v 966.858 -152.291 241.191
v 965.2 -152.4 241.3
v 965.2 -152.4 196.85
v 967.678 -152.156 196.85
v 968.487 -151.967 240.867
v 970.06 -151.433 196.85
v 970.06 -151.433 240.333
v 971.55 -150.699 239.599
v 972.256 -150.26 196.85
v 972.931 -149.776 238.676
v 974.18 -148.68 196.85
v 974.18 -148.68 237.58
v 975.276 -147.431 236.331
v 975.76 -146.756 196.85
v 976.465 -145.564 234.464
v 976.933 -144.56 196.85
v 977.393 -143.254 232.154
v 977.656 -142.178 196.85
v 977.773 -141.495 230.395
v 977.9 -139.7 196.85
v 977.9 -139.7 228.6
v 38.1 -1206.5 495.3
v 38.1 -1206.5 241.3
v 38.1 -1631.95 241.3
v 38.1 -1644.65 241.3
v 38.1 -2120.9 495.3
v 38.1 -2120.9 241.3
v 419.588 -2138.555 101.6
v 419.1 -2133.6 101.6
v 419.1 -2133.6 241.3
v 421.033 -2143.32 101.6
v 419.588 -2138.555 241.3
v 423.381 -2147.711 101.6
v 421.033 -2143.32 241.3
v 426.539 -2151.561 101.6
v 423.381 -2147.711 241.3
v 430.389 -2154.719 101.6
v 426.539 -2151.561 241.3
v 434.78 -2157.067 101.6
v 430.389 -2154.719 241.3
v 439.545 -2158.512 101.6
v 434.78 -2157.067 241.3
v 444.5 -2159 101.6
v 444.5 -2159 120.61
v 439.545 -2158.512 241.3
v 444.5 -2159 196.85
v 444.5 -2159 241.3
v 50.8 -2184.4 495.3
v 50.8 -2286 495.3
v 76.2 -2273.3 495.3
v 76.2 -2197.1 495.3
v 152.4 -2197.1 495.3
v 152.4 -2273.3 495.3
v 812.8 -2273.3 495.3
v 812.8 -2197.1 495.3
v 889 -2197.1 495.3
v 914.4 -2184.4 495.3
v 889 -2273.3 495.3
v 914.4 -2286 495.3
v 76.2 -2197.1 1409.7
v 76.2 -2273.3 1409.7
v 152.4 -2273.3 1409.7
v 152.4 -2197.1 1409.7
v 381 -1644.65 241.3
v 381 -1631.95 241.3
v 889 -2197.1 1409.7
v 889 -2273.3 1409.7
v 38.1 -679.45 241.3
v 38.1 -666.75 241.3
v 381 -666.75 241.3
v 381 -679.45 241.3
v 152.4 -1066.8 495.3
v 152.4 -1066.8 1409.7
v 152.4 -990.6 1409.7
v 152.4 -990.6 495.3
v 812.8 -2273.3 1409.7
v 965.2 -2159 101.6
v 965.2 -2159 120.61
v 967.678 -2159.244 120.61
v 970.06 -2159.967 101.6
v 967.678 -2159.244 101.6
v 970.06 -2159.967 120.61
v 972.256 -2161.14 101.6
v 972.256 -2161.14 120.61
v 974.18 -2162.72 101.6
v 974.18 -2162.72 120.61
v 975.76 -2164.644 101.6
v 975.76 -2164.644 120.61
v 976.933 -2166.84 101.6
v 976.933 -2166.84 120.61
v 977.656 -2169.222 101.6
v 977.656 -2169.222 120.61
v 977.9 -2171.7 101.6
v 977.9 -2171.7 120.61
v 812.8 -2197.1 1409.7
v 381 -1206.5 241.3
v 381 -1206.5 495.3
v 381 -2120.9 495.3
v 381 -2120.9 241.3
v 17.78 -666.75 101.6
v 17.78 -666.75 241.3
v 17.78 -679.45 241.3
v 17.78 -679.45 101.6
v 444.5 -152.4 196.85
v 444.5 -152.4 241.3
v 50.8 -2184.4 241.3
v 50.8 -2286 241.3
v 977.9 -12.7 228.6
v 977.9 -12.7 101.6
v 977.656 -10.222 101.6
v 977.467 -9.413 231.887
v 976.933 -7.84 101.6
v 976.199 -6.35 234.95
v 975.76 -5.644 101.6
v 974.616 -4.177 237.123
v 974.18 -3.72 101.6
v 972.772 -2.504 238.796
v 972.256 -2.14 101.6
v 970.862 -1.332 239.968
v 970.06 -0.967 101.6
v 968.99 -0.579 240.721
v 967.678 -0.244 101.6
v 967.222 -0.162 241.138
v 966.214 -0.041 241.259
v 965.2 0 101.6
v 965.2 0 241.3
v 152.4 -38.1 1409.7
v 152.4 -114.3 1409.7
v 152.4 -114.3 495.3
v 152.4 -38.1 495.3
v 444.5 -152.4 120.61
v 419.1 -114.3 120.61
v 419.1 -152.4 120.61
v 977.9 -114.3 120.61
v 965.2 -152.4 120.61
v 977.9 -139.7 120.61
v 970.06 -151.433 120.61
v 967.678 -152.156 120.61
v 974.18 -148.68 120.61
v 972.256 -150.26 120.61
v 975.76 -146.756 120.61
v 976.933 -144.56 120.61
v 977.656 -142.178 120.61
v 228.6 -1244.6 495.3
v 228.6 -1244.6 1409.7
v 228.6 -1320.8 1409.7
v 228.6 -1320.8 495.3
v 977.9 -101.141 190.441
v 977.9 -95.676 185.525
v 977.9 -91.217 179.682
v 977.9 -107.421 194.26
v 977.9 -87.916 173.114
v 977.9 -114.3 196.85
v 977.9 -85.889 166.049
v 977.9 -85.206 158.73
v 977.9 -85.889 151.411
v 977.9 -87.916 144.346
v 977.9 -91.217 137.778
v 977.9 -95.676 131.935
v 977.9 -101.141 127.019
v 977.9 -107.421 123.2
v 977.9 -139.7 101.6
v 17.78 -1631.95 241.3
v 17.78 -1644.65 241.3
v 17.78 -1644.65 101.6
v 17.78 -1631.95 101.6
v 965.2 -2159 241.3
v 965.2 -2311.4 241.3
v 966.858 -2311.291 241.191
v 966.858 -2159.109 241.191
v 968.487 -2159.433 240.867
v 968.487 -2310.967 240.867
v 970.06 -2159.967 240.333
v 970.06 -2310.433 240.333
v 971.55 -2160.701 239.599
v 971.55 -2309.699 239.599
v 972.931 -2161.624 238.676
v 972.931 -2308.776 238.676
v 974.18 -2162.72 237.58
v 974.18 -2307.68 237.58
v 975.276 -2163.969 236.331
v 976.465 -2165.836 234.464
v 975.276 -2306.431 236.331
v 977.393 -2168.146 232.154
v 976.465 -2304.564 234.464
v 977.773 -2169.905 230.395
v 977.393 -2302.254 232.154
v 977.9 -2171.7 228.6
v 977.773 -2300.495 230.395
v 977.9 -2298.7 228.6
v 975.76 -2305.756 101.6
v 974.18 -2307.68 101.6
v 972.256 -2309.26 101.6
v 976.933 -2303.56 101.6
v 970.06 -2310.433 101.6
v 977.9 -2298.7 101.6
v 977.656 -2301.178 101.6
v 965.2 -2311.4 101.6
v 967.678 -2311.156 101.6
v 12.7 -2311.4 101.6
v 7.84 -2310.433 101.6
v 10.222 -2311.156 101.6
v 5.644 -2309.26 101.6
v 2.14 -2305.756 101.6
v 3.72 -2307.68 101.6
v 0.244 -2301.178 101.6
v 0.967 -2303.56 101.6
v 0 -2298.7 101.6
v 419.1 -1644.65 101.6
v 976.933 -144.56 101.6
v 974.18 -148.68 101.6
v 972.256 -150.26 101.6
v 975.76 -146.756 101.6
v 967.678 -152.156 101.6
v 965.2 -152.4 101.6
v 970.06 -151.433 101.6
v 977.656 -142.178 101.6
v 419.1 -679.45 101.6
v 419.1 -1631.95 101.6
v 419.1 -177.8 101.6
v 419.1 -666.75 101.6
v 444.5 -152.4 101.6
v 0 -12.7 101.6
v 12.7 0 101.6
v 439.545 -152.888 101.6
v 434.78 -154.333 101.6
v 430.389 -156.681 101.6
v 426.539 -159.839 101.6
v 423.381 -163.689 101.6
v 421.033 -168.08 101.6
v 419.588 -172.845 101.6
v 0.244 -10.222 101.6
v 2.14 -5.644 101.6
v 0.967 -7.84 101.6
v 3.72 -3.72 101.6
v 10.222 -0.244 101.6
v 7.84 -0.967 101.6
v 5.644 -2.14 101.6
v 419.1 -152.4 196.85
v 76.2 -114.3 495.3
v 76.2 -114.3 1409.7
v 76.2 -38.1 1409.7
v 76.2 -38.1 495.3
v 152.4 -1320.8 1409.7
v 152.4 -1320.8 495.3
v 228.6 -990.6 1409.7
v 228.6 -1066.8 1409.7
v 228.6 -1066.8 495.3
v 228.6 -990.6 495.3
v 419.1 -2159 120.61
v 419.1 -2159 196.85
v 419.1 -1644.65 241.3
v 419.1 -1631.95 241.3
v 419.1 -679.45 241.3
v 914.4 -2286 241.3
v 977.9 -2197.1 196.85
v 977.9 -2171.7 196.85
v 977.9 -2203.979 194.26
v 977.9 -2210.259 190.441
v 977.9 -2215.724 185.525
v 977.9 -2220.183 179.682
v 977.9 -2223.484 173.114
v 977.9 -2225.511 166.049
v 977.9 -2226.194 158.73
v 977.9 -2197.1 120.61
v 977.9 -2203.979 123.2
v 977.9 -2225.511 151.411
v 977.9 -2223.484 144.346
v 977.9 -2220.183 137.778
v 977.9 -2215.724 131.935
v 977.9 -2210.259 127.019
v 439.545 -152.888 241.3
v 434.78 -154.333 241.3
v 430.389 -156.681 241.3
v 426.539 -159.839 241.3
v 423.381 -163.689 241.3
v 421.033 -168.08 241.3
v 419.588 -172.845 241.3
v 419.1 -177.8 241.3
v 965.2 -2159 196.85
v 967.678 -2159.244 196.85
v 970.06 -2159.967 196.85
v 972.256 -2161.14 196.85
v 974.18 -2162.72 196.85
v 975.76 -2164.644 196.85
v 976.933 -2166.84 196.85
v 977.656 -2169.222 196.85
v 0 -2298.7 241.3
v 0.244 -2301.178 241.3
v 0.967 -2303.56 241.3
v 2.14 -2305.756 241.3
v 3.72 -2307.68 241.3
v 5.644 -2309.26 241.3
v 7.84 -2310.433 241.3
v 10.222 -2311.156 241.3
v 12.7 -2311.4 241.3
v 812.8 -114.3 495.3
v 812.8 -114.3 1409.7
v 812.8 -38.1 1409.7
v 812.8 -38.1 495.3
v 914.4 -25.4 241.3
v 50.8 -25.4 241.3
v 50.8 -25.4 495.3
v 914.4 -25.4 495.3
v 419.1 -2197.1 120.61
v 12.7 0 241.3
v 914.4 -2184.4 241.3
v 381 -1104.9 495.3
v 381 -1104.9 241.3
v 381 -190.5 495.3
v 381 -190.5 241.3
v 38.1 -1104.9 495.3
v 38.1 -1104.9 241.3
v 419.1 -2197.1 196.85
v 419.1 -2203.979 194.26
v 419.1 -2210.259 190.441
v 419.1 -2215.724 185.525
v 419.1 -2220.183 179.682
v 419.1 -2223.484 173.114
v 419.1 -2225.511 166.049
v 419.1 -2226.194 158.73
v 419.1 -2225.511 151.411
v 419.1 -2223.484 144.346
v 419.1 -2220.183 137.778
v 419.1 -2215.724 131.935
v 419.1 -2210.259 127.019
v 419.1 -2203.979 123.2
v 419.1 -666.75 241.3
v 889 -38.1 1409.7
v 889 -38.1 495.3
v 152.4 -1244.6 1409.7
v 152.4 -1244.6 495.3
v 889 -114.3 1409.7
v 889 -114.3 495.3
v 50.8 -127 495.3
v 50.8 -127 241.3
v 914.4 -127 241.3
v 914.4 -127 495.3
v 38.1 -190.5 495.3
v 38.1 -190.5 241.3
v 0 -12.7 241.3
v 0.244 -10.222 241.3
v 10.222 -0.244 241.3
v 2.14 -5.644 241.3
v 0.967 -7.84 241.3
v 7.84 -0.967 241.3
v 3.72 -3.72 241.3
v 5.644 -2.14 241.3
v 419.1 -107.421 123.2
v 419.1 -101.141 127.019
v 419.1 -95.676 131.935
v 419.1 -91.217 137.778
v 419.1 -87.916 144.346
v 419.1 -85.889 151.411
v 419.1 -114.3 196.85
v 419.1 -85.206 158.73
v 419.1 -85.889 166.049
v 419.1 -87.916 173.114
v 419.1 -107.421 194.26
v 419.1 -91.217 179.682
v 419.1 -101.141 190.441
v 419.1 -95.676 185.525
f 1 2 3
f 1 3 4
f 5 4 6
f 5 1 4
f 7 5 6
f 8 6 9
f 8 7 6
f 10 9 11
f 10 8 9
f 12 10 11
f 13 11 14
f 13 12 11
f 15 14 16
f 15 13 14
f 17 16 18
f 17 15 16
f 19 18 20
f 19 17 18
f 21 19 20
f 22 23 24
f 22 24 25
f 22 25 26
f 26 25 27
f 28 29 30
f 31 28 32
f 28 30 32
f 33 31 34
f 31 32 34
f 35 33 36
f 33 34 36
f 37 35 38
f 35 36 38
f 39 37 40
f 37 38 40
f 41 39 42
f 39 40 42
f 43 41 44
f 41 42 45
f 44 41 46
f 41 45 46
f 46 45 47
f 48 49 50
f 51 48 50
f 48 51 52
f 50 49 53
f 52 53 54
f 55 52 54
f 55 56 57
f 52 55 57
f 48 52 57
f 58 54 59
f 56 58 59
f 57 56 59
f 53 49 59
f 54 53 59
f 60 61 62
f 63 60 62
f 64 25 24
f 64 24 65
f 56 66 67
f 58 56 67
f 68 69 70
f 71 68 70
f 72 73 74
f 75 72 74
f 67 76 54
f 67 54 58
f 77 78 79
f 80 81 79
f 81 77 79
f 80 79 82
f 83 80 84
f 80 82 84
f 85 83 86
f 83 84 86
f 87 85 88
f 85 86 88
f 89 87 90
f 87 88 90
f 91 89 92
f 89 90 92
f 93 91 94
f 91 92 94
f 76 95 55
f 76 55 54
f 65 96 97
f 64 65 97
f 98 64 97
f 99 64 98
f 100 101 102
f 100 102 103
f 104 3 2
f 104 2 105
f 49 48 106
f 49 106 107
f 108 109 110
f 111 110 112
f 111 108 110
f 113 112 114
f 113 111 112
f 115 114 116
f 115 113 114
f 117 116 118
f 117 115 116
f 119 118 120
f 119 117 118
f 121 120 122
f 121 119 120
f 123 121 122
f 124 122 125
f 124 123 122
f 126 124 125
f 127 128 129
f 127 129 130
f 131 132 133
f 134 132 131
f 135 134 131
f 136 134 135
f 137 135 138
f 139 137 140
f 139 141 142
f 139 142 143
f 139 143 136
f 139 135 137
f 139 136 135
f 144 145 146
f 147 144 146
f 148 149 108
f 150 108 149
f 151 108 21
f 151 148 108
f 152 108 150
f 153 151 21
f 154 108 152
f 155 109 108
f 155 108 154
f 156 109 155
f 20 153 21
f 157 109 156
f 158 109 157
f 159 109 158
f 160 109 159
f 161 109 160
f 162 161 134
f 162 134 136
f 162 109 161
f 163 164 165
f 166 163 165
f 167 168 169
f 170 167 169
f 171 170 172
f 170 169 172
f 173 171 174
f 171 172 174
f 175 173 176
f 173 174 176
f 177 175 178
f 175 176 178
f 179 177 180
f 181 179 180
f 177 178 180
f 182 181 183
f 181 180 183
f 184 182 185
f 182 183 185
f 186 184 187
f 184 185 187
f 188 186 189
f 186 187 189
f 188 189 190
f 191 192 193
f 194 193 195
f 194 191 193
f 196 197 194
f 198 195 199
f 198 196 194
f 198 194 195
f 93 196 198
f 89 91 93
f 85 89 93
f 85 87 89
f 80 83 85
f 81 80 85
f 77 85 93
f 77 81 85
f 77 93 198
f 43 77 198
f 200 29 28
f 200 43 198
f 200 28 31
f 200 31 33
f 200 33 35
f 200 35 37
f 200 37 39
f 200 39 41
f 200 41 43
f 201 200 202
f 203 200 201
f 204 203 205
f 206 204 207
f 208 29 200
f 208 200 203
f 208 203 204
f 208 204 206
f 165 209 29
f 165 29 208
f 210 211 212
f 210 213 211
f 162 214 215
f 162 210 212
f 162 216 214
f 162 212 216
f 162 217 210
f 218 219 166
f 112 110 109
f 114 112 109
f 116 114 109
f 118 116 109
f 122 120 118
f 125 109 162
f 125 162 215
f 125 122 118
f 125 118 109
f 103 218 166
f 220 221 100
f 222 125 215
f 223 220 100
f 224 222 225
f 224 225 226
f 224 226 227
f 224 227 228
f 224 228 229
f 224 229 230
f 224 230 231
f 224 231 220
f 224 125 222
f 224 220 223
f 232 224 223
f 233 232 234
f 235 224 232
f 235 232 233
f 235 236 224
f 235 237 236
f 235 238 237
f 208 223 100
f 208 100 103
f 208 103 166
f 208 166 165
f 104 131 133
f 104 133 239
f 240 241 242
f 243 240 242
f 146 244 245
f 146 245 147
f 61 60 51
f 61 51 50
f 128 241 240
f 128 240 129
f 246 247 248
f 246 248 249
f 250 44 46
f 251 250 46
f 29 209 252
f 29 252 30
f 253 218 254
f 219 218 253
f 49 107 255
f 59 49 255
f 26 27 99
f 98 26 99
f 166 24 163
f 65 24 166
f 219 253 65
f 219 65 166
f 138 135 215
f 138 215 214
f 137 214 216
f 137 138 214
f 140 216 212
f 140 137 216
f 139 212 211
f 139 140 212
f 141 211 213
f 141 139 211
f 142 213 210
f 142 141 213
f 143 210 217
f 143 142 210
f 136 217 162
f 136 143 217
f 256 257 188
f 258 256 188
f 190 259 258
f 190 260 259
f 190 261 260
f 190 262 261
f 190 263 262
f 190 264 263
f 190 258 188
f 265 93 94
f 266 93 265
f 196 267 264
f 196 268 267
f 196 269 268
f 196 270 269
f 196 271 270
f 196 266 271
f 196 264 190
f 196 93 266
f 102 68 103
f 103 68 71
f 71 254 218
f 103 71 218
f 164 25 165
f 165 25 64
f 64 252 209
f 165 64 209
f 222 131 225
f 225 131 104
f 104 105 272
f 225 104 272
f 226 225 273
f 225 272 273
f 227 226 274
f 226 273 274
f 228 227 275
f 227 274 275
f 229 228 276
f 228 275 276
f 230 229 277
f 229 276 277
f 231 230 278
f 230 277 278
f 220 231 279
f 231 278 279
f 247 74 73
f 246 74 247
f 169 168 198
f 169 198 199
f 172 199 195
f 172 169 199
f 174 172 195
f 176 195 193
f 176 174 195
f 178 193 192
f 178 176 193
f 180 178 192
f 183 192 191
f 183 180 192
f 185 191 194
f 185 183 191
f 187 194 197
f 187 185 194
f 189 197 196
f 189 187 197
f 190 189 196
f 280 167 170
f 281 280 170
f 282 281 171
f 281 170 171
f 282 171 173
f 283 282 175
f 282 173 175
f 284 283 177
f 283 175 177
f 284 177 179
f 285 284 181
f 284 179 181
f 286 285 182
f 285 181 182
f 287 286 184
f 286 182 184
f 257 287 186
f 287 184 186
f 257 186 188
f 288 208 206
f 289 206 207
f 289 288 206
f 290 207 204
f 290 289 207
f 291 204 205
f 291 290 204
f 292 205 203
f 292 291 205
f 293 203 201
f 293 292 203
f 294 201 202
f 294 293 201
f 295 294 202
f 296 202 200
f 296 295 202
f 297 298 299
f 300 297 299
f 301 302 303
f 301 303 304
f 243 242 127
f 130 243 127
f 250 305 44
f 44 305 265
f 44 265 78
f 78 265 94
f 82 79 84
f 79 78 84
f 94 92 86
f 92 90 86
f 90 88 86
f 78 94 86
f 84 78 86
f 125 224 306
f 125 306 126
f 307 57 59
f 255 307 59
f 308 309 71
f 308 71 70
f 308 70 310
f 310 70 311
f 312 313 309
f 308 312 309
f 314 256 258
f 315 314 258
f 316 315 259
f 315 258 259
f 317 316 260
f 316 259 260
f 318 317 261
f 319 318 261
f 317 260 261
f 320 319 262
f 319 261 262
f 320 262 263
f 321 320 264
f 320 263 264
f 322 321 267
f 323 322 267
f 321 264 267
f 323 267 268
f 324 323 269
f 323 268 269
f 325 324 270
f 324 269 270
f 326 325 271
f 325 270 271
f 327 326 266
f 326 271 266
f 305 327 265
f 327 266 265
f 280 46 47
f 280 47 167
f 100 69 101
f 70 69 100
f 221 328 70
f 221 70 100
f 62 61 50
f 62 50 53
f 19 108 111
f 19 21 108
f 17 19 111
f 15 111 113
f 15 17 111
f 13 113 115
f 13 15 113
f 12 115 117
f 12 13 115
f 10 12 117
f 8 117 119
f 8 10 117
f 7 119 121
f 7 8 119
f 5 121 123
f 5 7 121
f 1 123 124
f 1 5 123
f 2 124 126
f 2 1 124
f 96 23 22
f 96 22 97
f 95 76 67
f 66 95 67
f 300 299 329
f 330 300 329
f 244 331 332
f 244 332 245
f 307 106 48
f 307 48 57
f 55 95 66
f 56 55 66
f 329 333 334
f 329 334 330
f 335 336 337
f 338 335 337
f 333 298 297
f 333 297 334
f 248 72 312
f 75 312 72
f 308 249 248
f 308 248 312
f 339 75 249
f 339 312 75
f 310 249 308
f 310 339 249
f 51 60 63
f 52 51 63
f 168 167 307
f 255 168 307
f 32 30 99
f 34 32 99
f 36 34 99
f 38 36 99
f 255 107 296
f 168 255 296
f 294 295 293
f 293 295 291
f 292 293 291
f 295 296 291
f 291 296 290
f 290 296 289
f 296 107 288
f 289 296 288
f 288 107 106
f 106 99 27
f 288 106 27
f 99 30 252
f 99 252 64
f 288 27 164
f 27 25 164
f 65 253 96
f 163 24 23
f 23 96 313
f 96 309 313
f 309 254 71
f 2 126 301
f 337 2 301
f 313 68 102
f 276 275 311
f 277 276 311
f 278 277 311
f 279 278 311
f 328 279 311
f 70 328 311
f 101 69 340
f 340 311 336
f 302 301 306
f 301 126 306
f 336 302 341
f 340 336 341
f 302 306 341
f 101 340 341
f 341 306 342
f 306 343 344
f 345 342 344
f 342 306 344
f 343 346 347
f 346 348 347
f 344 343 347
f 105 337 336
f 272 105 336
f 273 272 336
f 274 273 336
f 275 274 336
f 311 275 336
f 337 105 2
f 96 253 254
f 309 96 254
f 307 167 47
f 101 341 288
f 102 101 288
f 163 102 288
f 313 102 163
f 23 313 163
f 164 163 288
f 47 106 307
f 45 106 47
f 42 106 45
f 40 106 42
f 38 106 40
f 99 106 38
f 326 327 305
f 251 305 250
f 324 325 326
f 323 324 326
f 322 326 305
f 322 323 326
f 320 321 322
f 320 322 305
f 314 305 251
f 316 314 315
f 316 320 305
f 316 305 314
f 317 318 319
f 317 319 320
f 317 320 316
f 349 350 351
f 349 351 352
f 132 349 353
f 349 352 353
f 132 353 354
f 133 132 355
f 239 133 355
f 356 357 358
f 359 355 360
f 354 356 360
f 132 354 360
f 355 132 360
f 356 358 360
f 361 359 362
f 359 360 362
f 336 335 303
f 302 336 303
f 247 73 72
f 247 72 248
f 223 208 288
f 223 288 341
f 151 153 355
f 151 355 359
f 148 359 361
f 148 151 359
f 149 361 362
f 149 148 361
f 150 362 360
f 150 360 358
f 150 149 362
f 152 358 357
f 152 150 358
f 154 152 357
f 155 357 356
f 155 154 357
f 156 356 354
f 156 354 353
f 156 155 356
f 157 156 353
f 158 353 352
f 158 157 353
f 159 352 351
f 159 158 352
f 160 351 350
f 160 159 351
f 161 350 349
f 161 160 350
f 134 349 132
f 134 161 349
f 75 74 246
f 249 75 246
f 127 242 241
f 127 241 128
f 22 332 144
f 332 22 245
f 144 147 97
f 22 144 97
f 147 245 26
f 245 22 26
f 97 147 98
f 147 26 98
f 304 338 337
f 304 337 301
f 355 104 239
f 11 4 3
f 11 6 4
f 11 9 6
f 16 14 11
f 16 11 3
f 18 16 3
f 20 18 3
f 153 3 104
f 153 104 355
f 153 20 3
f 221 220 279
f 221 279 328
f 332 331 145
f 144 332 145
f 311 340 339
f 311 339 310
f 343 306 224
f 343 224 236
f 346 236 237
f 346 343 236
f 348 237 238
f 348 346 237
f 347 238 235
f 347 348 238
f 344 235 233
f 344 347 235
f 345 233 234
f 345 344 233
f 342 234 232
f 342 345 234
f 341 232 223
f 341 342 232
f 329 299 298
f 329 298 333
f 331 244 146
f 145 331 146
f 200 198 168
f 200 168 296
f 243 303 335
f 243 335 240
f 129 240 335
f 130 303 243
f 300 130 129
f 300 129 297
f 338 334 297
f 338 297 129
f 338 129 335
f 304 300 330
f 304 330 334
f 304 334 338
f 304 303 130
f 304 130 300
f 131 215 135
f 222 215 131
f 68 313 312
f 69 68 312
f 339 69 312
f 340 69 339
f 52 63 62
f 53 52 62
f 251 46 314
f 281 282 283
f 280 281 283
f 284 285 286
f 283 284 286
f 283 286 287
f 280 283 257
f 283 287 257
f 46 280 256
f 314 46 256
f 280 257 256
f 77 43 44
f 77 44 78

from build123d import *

# Parameters (mm, degrees)
BOSS_EXTRUDE1_DEPTH = 241.3
FILLET1_R           = 25.4
FILLET2_R           = 12.7
CUT_EXTRUDE1_DEPTH  = 558.8
SKETCH3_W           = 1114.093901139
SKETCH3_H           = 2455.440787086
CUT_EXTRUDE5_DEPTH  = 101.6
SKETCH4_W           = 139.7
SKETCH4_H           = 12.7
CUT_EXTRUDE6_DEPTH  = 401.32
SKETCH9_W           = 863.6
SKETCH9_H           = 101.6
SKETCH9_W_2         = 342.9
SKETCH9_H_2         = 914.4
BOSS_EXTRUDE5_DEPTH = 254
SKETCH10_W          = 76.2
SKETCH10_H          = 76.2
BOSS_EXTRUDE6_DEPTH = 914.4


with BuildPart() as part:
    # Sketch1 → Boss-Extrude1 (new body)
    with BuildSketch(Plane.XY):
        Polygon((977.9, -152.4), (419.1, -152.4), (419.1, -2159), (977.9, -2159), (977.9, -2311.4), (0, -2311.4), (0, 0), (977.9, 0), align=None)
    extrude(amount=BOSS_EXTRUDE1_DEPTH)

    # Fillet1
    fillet1_edges = [part.edges().sort_by_distance(p)[0] for p in [
        (419.1, -152.4, 120.65),
        (419.1, -2159, 120.65),
    ]]
    fillet(fillet1_edges, radius=FILLET1_R)

    # Fillet2
    fillet2_edges = [part.edges().sort_by_distance(p)[0] for p in [
        (977.9, -2235.2, 241.3),
        (0, 0, 120.65),
        (977.9, 0, 120.65),
        (977.9, -152.4, 120.65),
        (977.9, -2159, 120.65),
        (977.9, -2311.4, 120.65),
        (0, -2311.4, 120.65),
        (977.9, -76.2, 241.3),
        (977.9, -76.2, 0),
        (977.9, -2235.2, 0),
    ]]
    fillet(fillet2_edges, radius=FILLET2_R)

    # Sketch2 → Cut-Extrude1 (cut)
    with BuildSketch(Plane(origin=(977.9, 0, 0), x_dir=(0, 0, -1), z_dir=(1, 0, 0))):
        with BuildLine():
            Line((-196.85, -152.4), (-196.85, -114.3))
            ThreePointArc((-196.85, -114.3), (-158.73, -85.205737384), (-120.61, -114.3))
            Line((-120.61, -114.3), (-120.61, -152.4))
            Line((-120.61, -152.4), (-196.85, -152.4))
        make_face()
    cut_extrude1 = extrude(amount=-CUT_EXTRUDE1_DEPTH, mode=Mode.SUBTRACT)

    # Mirror1: Cut-Extrude1 across plane
    add(cut_extrude1.mirror(Plane.ZX.offset(-1155.7)), mode=Mode.SUBTRACT)

    # Sketch3 → Cut-Extrude5 (cut)
    with BuildSketch(Plane(origin=(0, 0, 0), x_dir=(-1, 0, 0), z_dir=(0, 0, -1))):
        with Locations((-472.168855083, -1170.106383975)):
            Rectangle(SKETCH3_W, SKETCH3_H)
    extrude(amount=-CUT_EXTRUDE5_DEPTH, mode=Mode.SUBTRACT)

    # Sketch4 → Cut-Extrude6 (cut)
    with BuildSketch(Plane(origin=(419.1, 0, 0), x_dir=(0, 0, -1), z_dir=(1, 0, 0))):
        with Locations((-171.45, -673.1)):
            Rectangle(SKETCH4_W, SKETCH4_H)
    cut_extrude6 = extrude(amount=-CUT_EXTRUDE6_DEPTH, mode=Mode.SUBTRACT)

    # Mirror2: Cut-Extrude6 across plane
    add(cut_extrude6.mirror(Plane.ZX.offset(-1155.7)), mode=Mode.SUBTRACT)

    # Sketch9 → Boss-Extrude5 (add)
    with BuildSketch(Plane.XY.offset(241.3)):
        with Locations((482.6, -76.2)):
            Rectangle(SKETCH9_W, SKETCH9_H)
        with Locations((209.55, -647.7)):
            Rectangle(SKETCH9_W_2, SKETCH9_H_2)
    boss_extrude5 = extrude(amount=BOSS_EXTRUDE5_DEPTH)

    # Sketch10 → Boss-Extrude6 (add)
    with BuildSketch(Plane.XY.offset(495.3)):
        with Locations((114.3, -76.2)):
            Rectangle(SKETCH10_W, SKETCH10_H)
        with Locations((850.9, -76.2)):
            Rectangle(SKETCH10_W, SKETCH10_H)
        with Locations((190.5, -1028.7)):
            Rectangle(SKETCH10_W, SKETCH10_H)
    boss_extrude6 = extrude(amount=BOSS_EXTRUDE6_DEPTH)

    # Mirror4: Boss-Extrude5, Boss-Extrude6 across plane
    add(boss_extrude5.mirror(Plane.ZX.offset(-1155.7)))
    add(boss_extrude6.mirror(Plane.ZX.offset(-1155.7)))


solid = part.part
